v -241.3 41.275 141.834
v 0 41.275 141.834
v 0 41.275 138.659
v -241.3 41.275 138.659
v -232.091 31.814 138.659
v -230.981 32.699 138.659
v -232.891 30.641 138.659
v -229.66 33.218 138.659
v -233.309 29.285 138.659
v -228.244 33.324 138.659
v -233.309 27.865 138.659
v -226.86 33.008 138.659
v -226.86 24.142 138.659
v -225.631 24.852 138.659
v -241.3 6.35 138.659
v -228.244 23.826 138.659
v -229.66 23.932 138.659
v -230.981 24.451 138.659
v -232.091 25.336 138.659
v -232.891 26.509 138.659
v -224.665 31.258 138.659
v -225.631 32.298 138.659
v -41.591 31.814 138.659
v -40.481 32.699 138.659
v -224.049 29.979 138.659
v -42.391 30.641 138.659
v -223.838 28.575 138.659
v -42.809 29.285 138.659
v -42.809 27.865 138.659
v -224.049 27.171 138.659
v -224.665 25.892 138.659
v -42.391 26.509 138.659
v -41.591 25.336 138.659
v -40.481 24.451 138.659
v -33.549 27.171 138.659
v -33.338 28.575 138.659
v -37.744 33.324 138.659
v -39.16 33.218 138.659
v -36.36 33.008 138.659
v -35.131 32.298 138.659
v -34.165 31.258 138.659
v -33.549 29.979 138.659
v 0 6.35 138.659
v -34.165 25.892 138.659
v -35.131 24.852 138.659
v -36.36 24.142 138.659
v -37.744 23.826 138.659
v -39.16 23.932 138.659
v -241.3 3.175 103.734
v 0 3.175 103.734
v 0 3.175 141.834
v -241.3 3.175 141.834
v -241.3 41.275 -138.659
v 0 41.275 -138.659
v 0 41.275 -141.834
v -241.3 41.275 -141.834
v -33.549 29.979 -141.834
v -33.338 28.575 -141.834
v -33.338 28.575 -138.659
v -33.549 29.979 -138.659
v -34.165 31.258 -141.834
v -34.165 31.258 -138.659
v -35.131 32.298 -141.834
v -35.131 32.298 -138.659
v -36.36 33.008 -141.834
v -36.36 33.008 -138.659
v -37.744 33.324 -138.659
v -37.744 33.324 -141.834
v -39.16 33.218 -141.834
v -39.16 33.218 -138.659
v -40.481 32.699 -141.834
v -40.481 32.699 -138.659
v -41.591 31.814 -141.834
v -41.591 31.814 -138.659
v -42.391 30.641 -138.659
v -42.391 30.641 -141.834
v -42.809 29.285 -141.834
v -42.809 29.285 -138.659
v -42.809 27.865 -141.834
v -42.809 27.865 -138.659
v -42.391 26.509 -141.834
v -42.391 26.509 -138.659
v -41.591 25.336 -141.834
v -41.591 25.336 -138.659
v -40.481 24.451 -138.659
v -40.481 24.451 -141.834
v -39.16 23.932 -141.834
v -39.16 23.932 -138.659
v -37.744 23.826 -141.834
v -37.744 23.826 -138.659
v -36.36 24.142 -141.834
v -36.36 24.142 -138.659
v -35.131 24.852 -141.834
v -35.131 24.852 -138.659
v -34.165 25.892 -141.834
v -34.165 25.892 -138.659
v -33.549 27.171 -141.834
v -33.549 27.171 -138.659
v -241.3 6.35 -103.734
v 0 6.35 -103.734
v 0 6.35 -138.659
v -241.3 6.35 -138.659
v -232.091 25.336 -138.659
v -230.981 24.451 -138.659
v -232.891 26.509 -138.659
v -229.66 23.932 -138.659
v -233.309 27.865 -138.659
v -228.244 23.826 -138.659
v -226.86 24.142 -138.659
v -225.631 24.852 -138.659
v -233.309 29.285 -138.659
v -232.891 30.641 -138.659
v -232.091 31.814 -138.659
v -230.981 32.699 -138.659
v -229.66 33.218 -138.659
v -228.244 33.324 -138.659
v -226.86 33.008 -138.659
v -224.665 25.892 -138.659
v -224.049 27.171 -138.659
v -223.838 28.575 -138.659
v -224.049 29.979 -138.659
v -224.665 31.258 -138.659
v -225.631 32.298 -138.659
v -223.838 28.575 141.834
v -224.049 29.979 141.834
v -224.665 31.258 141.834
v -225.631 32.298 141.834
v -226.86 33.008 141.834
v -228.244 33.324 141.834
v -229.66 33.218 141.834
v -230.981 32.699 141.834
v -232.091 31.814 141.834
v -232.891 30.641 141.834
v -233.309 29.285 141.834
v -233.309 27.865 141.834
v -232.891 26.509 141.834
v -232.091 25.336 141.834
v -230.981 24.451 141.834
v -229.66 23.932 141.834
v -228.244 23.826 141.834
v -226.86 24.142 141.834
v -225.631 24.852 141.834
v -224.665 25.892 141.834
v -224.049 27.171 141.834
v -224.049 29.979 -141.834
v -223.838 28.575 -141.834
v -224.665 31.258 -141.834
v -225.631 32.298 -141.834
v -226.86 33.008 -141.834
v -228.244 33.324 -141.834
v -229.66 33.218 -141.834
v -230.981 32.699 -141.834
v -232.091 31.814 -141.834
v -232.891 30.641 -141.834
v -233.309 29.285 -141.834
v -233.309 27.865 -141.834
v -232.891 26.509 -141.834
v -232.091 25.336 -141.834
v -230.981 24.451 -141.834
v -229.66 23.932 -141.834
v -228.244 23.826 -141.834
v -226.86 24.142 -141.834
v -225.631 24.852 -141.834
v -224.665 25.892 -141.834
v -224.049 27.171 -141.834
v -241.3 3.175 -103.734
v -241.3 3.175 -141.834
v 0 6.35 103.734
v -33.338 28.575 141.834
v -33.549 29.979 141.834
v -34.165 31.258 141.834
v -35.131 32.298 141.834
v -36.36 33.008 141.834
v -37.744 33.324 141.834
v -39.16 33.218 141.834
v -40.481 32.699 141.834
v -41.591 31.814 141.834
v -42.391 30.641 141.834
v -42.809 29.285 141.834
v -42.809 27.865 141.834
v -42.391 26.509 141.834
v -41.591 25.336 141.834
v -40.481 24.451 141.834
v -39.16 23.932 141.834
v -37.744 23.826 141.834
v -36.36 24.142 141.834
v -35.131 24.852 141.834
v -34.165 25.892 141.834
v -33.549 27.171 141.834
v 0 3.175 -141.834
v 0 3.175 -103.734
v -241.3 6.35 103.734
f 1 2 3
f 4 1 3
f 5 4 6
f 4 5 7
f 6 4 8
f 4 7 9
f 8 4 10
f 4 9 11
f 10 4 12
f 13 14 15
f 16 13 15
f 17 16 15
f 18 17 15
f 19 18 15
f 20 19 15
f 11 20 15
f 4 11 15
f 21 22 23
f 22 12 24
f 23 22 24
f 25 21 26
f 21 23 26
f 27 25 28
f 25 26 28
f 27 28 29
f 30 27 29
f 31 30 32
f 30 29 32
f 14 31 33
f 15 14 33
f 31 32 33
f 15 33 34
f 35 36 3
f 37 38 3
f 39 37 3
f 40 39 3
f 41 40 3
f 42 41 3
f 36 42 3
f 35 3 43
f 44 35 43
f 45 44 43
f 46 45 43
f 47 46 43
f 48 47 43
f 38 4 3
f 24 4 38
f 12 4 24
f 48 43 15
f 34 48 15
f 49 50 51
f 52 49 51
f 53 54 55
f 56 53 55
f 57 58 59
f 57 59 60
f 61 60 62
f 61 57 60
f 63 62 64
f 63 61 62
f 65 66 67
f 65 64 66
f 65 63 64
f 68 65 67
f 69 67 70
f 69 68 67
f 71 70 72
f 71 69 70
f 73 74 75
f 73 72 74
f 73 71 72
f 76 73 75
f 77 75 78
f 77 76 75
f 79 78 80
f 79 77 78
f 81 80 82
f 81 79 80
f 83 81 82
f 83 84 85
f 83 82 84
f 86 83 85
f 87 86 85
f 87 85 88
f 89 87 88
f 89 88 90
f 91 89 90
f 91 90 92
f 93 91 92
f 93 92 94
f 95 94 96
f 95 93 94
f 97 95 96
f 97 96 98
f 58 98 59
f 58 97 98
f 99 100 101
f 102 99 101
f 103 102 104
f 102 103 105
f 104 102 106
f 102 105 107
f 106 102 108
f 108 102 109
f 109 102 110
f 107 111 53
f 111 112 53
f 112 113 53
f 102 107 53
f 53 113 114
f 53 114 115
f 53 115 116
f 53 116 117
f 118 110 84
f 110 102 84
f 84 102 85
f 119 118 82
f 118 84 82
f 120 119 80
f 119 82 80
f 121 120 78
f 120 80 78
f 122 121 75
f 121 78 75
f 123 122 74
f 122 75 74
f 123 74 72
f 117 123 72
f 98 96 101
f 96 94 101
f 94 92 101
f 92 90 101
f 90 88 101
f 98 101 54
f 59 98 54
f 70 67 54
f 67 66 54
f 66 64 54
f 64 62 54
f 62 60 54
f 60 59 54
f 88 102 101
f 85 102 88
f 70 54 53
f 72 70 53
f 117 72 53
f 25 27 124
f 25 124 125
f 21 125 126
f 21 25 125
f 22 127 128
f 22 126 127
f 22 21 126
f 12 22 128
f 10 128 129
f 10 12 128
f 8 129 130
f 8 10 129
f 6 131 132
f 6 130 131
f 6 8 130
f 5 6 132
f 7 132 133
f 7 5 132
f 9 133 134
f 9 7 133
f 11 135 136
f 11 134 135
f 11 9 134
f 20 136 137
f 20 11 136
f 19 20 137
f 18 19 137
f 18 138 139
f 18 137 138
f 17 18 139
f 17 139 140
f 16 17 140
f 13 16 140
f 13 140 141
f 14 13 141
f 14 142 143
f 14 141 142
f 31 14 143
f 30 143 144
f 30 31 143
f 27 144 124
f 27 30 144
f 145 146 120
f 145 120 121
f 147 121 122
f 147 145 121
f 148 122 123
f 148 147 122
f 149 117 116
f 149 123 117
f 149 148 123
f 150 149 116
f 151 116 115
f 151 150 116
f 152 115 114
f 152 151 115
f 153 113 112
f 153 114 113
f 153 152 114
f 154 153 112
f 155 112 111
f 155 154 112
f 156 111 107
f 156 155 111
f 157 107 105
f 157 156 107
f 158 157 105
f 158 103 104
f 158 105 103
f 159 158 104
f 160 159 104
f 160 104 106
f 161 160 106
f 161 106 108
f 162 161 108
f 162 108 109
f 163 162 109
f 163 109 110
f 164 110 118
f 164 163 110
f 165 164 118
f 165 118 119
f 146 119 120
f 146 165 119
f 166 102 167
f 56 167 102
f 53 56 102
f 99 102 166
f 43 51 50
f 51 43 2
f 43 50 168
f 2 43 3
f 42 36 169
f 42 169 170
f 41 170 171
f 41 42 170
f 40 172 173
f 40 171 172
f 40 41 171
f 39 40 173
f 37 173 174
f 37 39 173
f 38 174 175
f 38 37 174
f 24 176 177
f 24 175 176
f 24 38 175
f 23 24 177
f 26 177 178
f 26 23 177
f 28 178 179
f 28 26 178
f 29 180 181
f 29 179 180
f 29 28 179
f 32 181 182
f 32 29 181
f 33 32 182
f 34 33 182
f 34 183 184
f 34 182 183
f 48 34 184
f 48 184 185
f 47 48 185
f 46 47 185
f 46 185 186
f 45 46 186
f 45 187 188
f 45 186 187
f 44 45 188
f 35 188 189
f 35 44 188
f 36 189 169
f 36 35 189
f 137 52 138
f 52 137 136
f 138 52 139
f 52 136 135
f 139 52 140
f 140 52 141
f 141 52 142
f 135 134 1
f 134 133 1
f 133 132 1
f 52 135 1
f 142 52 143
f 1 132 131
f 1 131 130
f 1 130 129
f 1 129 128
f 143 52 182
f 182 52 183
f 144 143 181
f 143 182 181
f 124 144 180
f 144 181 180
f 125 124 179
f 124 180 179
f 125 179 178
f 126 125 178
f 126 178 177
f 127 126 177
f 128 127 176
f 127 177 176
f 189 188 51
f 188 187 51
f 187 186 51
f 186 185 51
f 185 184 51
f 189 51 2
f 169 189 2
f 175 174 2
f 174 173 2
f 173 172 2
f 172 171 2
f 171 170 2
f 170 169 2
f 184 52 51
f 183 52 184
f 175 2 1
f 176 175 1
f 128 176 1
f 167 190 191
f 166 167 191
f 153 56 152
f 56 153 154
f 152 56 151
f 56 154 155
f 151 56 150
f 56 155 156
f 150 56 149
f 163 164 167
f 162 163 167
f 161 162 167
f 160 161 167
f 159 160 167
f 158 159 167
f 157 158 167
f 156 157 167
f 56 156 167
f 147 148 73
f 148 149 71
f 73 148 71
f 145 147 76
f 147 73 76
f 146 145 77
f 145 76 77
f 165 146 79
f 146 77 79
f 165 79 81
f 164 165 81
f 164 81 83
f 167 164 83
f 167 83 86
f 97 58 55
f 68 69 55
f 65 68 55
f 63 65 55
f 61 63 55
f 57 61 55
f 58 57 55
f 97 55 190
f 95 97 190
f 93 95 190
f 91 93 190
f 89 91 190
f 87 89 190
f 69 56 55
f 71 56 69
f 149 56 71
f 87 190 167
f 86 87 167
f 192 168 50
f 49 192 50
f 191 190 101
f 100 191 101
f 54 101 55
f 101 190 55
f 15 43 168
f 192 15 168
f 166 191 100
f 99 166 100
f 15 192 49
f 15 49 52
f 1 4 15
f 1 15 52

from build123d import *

# Parameters (mm, degrees)
EXTRUDE_THIN1_DEPTH     = 190.5
EXTRUDE_THIN2_DEPTH     = 241.3
CUT_EXTRUDE3_DEPTH      = 311.192787835
CUT_EXTRUDE3_DEPTH_BACK = 311.192787835
SKETCH5_R               = 4.7625
CUT_EXTRUDE4_DEPTH      = 311.192787835
CUT_EXTRUDE4_DEPTH_BACK = 311.192787835
SKETCH6_W               = 38.1
SKETCH6_H               = 41.275


with BuildPart() as part:
    # Sketch1 → Extrude-Thin1 (new, symmetric)
    with BuildSketch(Plane.XY):
        Polygon((38.1, 0), (0, 0), (0, 38.1), (3.175, 38.1), (3.175, 3.175), (38.1, 3.175), align=None)
    extrude(amount=EXTRUDE_THIN1_DEPTH, both=True)

    # Sketch2 → Extrude-Thin2 (add)
    with BuildSketch(Plane.ZY):
        Polygon((103.7336, 3.175), (141.8336, 3.175), (141.8336, 41.275), (138.6586, 41.275), (138.6586, 6.35), (103.7336, 6.35), align=None)
        Polygon((-103.7336, 3.175), (-141.8336, 3.175), (-141.8336, 41.275), (-138.6586, 41.275), (-138.6586, 6.35), (-103.7336, 6.35), align=None)
    extrude(amount=EXTRUDE_THIN2_DEPTH)

    # Sketch5 → Cut-Extrude3 (cut, two sides: drawn at the far end of the back side and taken through both)
    with BuildSketch(Plane.XY.offset(-CUT_EXTRUDE3_DEPTH_BACK)):
        with Locations((-228.6, 28.575)):
            Circle(SKETCH5_R)
        with Locations((-38.1, 28.575)):
            Circle(SKETCH5_R)
    extrude(amount=CUT_EXTRUDE3_DEPTH + CUT_EXTRUDE3_DEPTH_BACK, mode=Mode.SUBTRACT)

    # Sketch6 → Cut-Extrude4 (cut, two sides: drawn at the far end of the back side and taken through both)
    with BuildSketch(Plane.XY.offset(-CUT_EXTRUDE4_DEPTH_BACK)):
        with Locations((19.05, 20.6375)):
            Rectangle(SKETCH6_W, SKETCH6_H)
    extrude(amount=CUT_EXTRUDE4_DEPTH + CUT_EXTRUDE4_DEPTH_BACK, mode=Mode.SUBTRACT)


with BuildPart() as cut_extrude4_piece_1:
    # of the separate pieces the step leaves, piece 1, a body of its own (cut_extrude4_pieces)
    add(part.part.solids().sort_by_distance((0, 3.175, 141.8336))[0])


with BuildPart() as cut_extrude4_piece_2:
    # of the separate pieces the step leaves, piece 2, a body of its own (cut_extrude4_pieces)
    add(part.part.solids().sort_by_distance((0, 41.275, -138.6586))[0])


solid = Compound([cut_extrude4_piece_1.part, cut_extrude4_piece_2.part])
